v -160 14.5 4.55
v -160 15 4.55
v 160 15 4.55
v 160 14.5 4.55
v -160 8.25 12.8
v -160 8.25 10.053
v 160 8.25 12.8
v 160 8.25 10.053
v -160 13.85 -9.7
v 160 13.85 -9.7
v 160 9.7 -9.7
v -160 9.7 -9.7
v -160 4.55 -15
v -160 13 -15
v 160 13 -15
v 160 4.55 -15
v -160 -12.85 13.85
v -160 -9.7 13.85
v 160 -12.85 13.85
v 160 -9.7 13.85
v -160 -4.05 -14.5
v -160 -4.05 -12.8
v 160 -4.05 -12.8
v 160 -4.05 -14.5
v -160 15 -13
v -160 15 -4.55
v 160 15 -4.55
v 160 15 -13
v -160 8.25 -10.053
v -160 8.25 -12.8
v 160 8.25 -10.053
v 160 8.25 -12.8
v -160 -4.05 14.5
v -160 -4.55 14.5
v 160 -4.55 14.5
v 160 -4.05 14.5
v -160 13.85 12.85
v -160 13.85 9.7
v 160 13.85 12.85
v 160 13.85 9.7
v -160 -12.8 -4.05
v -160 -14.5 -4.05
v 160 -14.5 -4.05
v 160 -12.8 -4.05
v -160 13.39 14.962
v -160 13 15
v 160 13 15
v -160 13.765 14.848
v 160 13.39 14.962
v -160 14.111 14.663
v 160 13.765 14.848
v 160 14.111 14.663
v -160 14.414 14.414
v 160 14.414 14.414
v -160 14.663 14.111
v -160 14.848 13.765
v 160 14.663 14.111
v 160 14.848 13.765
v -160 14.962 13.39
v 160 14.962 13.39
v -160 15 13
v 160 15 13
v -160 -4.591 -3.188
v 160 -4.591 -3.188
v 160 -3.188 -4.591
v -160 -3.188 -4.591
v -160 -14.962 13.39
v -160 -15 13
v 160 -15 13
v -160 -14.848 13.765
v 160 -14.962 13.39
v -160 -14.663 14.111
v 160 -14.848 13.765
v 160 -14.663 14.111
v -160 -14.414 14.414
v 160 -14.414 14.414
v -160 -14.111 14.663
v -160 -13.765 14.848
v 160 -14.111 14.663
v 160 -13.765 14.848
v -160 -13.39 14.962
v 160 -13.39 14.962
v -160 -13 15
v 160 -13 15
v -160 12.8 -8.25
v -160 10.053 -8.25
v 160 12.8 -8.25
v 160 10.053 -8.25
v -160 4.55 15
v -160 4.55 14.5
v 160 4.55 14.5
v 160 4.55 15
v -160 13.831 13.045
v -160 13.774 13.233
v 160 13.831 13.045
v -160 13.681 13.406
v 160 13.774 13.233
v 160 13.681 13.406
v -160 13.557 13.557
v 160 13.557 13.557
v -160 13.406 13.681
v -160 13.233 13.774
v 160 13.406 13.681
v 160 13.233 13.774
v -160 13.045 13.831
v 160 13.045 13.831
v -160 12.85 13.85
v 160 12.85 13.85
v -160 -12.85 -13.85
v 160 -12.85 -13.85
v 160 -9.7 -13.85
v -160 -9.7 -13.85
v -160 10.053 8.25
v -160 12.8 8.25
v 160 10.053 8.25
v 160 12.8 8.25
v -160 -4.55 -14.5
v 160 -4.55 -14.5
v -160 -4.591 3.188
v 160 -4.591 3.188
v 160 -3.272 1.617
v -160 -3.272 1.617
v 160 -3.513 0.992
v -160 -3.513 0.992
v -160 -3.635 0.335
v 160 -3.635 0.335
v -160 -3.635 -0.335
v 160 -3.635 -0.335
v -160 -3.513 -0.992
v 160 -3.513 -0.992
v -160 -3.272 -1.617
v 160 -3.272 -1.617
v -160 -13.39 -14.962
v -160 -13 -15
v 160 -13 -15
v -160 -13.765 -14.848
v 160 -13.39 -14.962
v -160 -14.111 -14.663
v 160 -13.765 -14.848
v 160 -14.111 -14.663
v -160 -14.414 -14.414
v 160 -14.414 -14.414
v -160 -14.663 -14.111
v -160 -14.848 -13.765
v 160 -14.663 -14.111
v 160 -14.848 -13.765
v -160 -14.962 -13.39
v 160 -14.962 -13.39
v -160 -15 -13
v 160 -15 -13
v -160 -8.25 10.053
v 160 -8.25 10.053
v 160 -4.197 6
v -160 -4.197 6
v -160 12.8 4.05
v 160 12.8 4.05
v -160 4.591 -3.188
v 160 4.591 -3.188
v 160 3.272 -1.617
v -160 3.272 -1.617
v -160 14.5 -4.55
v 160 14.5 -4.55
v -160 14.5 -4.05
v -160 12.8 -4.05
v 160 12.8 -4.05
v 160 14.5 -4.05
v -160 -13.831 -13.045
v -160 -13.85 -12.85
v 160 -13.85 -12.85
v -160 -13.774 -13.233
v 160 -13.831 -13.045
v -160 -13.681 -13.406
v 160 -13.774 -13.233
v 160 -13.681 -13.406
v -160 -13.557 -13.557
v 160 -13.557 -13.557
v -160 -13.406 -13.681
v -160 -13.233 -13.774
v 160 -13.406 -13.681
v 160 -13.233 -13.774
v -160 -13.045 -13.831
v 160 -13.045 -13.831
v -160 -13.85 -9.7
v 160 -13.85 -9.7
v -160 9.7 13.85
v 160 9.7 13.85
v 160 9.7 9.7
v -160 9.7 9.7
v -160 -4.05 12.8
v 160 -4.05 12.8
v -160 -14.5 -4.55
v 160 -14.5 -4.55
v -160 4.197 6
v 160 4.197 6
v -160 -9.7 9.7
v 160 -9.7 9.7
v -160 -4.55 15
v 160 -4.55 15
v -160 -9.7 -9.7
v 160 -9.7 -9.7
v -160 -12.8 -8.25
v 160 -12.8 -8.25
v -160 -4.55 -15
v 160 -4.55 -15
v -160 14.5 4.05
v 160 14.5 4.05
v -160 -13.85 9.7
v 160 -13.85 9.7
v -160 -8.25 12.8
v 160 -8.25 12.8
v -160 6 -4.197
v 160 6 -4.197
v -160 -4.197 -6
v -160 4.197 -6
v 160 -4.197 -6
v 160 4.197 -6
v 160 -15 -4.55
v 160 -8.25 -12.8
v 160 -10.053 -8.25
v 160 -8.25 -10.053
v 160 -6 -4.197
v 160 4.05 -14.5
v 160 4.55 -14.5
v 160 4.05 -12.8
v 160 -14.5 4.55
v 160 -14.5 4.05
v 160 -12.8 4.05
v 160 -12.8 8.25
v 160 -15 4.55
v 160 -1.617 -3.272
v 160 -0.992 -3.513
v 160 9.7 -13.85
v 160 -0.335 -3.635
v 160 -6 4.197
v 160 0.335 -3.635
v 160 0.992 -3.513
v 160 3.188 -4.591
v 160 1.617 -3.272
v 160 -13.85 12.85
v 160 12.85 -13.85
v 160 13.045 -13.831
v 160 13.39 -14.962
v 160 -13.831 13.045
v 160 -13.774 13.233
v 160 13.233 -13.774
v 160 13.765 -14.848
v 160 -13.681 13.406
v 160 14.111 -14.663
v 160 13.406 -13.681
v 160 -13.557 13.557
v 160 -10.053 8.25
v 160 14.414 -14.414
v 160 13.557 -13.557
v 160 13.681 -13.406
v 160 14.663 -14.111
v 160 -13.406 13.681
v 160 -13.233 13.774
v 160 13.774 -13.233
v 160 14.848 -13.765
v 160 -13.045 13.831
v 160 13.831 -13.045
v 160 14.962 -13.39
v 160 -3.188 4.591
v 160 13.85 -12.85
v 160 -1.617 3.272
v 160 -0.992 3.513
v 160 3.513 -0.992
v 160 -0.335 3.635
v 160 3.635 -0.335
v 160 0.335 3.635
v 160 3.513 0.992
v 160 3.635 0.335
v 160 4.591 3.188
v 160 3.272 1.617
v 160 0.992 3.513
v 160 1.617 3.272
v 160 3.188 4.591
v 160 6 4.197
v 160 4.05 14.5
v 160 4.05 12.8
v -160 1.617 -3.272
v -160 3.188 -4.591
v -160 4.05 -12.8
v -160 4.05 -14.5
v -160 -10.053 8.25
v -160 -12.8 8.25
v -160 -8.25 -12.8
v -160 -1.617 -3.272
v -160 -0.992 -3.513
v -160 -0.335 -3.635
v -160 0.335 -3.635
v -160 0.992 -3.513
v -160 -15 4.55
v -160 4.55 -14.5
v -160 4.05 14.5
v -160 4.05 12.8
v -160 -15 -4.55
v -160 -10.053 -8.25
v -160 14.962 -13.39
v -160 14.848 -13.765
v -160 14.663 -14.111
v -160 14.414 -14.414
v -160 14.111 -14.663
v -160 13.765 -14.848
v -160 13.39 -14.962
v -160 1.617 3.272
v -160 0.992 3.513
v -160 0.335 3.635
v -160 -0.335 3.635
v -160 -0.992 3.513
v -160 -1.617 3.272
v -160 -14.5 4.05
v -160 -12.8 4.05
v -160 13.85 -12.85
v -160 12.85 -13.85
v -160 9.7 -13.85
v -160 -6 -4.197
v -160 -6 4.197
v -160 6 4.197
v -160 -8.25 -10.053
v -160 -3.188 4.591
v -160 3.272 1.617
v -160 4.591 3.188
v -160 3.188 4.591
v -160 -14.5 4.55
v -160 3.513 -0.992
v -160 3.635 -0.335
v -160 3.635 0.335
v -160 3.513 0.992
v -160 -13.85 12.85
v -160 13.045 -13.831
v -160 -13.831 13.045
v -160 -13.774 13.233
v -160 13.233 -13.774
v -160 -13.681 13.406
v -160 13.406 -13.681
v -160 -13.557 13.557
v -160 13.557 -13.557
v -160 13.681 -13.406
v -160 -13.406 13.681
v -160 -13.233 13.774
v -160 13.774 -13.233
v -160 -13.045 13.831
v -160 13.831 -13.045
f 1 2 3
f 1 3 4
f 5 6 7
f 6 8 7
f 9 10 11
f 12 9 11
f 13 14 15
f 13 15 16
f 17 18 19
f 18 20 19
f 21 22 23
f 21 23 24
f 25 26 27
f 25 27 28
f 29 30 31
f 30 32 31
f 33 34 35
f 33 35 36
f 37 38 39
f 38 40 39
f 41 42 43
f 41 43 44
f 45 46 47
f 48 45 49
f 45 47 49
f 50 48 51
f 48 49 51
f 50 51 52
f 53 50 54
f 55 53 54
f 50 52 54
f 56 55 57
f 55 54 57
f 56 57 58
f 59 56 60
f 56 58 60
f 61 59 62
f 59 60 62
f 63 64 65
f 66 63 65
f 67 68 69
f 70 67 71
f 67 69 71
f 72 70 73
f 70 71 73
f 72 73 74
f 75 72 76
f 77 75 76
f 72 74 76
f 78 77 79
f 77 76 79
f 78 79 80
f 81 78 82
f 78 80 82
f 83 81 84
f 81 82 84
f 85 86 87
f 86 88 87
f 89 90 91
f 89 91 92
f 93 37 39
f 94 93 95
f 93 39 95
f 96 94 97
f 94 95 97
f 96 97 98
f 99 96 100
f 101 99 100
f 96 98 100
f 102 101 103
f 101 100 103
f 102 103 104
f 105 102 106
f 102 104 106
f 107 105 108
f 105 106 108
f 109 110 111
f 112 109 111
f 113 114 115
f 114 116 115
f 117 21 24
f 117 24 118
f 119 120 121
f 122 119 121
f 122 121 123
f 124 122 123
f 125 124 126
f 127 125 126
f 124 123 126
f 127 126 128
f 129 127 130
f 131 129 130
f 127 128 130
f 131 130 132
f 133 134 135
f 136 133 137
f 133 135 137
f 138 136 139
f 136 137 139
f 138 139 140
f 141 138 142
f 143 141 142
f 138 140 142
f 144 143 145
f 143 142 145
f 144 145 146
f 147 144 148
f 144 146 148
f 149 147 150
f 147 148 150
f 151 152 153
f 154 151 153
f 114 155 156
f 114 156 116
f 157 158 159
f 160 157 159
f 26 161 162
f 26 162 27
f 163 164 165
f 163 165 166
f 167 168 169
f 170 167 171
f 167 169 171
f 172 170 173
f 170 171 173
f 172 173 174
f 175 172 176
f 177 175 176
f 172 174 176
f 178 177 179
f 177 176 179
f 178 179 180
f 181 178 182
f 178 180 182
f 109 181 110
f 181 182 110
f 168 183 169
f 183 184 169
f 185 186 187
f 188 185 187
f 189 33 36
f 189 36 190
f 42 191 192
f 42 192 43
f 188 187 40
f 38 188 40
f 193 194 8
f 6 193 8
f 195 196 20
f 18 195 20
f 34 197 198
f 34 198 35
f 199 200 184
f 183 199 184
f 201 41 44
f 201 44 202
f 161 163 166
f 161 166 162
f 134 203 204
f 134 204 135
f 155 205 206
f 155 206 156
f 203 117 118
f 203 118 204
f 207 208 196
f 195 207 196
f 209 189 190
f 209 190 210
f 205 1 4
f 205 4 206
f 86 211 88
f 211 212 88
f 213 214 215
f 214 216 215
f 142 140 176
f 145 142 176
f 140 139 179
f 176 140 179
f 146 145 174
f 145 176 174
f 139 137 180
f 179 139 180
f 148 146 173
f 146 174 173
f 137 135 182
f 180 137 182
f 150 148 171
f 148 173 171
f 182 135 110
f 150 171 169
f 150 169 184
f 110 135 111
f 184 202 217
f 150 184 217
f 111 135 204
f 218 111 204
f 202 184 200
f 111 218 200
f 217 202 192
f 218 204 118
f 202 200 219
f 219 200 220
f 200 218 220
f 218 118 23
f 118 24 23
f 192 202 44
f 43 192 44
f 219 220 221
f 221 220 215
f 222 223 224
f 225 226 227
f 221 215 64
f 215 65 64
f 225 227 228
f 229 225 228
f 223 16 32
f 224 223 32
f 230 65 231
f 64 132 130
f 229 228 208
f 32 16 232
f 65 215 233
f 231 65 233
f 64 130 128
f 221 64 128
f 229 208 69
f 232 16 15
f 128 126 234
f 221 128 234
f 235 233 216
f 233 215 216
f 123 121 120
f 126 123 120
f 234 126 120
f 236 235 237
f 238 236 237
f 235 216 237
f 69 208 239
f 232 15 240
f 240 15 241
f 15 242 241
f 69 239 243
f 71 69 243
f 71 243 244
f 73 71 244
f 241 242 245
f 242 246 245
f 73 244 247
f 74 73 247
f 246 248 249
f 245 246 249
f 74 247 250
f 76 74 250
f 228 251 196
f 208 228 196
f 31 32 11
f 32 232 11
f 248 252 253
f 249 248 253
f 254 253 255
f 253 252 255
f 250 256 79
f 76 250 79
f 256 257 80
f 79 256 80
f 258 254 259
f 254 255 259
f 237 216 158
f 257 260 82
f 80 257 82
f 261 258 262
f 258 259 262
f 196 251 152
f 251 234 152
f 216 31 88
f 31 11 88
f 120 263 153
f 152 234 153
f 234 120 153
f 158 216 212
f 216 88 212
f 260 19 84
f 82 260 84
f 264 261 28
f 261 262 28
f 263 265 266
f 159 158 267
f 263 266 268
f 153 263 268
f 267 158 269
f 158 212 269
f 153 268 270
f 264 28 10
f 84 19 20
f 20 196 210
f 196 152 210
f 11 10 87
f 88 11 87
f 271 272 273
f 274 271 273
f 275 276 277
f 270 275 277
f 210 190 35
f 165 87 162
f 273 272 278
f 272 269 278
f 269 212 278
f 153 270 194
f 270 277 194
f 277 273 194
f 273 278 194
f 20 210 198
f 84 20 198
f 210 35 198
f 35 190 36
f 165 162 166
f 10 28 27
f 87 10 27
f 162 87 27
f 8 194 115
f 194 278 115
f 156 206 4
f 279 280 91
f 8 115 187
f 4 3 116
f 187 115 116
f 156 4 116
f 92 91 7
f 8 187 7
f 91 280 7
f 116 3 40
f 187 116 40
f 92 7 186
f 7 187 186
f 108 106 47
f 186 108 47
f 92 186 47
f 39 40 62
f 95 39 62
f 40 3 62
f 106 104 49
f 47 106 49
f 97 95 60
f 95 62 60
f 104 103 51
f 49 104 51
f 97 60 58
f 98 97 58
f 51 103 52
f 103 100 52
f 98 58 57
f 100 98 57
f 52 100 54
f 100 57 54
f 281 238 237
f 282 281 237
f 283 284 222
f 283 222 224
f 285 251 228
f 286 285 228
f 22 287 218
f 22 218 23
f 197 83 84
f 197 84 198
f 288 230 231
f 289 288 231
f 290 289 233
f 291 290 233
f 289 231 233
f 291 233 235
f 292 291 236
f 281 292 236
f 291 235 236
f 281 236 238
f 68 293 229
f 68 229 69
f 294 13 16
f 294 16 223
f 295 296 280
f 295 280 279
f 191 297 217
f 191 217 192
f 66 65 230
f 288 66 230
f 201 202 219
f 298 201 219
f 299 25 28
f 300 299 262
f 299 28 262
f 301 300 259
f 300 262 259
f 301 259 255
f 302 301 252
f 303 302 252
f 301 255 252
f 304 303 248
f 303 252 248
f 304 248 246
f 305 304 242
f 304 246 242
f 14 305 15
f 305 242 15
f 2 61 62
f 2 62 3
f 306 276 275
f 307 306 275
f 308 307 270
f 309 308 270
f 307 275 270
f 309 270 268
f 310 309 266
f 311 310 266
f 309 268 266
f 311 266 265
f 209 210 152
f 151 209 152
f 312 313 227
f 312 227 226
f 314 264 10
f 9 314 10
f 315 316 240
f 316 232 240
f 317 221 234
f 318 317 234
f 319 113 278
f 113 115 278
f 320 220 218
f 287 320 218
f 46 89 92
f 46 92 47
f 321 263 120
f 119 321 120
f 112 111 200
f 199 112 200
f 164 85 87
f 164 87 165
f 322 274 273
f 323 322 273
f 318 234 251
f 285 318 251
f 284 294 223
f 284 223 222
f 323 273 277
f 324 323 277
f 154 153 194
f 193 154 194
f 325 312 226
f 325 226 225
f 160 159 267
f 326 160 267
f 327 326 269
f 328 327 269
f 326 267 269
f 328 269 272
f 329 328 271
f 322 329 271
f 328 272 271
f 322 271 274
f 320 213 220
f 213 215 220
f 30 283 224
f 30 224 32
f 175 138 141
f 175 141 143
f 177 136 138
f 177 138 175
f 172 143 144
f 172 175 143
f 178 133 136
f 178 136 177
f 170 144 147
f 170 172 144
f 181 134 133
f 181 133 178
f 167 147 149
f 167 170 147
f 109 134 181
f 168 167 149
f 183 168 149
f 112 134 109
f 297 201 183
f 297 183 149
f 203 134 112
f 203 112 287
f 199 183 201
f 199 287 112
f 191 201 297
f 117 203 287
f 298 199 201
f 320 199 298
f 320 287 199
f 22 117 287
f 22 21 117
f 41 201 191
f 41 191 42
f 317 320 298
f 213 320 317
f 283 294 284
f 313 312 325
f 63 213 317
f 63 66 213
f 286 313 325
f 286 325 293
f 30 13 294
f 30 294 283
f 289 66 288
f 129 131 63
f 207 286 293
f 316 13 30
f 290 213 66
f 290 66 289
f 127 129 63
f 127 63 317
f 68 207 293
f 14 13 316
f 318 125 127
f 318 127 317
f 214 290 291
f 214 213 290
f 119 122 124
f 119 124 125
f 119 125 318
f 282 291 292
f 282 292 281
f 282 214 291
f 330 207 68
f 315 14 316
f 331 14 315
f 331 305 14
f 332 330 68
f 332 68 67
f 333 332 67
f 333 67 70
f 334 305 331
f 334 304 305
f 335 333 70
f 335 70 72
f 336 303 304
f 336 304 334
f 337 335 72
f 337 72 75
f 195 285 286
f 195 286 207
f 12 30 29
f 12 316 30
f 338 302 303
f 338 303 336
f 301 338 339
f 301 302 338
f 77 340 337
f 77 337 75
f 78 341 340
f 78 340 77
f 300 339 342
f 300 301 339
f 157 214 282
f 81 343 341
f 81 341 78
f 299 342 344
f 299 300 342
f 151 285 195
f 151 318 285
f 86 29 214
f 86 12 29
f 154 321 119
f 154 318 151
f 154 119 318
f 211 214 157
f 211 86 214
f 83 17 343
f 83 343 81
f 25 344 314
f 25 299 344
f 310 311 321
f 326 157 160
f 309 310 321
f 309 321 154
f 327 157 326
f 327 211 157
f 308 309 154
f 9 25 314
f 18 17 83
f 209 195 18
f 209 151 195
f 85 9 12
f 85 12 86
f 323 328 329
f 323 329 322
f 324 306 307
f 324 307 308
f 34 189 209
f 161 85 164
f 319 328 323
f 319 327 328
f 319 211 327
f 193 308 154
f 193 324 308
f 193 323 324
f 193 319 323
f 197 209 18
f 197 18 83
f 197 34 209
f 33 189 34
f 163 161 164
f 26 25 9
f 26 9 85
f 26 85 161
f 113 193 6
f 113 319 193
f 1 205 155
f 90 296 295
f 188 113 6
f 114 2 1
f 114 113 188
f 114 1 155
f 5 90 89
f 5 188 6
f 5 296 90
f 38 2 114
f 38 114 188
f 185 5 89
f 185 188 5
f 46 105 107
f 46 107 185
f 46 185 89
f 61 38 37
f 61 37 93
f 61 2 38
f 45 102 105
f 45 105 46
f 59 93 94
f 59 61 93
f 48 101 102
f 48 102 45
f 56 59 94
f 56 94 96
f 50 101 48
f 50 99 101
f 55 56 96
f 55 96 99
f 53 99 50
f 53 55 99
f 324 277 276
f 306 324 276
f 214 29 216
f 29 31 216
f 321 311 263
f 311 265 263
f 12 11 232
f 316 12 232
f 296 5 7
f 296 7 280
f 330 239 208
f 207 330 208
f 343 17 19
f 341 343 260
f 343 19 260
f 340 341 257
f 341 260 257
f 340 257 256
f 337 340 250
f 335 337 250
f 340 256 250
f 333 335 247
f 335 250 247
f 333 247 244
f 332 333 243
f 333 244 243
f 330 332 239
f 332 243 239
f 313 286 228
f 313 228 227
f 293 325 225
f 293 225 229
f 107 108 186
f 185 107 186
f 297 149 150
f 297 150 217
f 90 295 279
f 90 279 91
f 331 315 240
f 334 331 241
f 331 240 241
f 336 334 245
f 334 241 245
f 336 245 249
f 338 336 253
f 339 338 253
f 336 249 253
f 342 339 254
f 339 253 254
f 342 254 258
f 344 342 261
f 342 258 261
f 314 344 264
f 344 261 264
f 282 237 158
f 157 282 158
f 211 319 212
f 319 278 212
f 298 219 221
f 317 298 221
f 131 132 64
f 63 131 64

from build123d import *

# Parameters (mm, degrees)
BR_EXTRUDE_DEPTH      = 160
BR_EXTRUDE_DEPTH_BACK = 160


with BuildPart() as part:
    # Sketch2 → BR_Extrude (new body, two sides)
    with BuildSketch(Plane(origin=(0, 0, 0), x_dir=(0, 0, -1), z_dir=(1, 0, 0))) as br_extrude_sk:
        with BuildLine():
            Line((-6, 4.196877708), (-10.053122292, 8.25))
            Line((-10.053122292, 8.25), (-12.8, 8.25))
            Line((-12.8, 8.25), (-12.800036742, 4.05))
            Line((-12.800036742, 4.05), (-14.5, 4.05))
            Line((-14.5, 4.05), (-14.5, 4.55))
            Line((-14.5, 4.55), (-15, 4.55))
            Line((-15, 4.55), (-15, 13))
            ThreePointArc((-15, 13), (-14.414213562, 14.414213562), (-13, 15))
            Line((-13, 15), (-4.55, 15))
            Line((-4.55, 15), (-4.55, 14.5))
            Line((-4.55, 14.5), (-4.05, 14.5))
            Line((-4.05, 14.5), (-4.05, 12.800036742))
            Line((-4.05, 12.800036742), (-8.25, 12.8))
            Line((-8.25, 12.8), (-8.25, 10.053122292))
            Line((-8.25, 10.053122292), (-4.196877708, 6))
            Line((-4.196877708, 6), (4.196877708, 6))
            Line((4.196877708, 6), (8.25, 10.053122292))
            Line((8.25, 10.053122292), (8.25, 12.8))
            Line((8.25, 12.8), (4.05, 12.800036742))
            Line((4.05, 12.800036742), (4.05, 14.5))
            Line((4.05, 14.5), (4.55, 14.5))
            Line((4.55, 14.5), (4.55, 15))
            Line((4.55, 15), (13, 15))
            ThreePointArc((13, 15), (14.414213562, 14.414213562), (15, 13))
            Line((15, 13), (15, 4.55))
            Line((15, 4.55), (14.5, 4.55))
            Line((14.5, 4.55), (14.5, 4.05))
            Line((14.5, 4.05), (12.800036742, 4.05))
            Line((12.800036742, 4.05), (12.8, 8.25))
            Line((12.8, 8.25), (10.053122292, 8.25))
            Line((10.053122292, 8.25), (6, 4.196877708))
            Line((6, 4.196877708), (6, -4.196877708))
            Line((6, -4.196877708), (10.053122292, -8.25))
            Line((10.053122292, -8.25), (12.8, -8.25))
            Line((12.8, -8.25), (12.800036742, -4.05))
            Line((12.800036742, -4.05), (14.5, -4.05))
            Line((14.5, -4.05), (14.5, -4.55))
            Line((14.5, -4.55), (15, -4.55))
            Line((15, -4.55), (15, -13))
            ThreePointArc((15, -13), (14.414213562, -14.414213562), (13, -15))
            Line((13, -15), (4.55, -15))
            Line((4.55, -15), (4.55, -14.5))
            Line((4.55, -14.5), (4.05, -14.5))
            Line((4.05, -14.5), (4.05, -12.800036742))
            Line((4.05, -12.800036742), (8.25, -12.8))
            Line((8.25, -12.8), (8.25, -10.053122292))
            Line((8.25, -10.053122292), (4.196877708, -6))
            Line((4.196877708, -6), (-4.196877708, -6))
            Line((-4.196877708, -6), (-8.25, -10.053122292))
            Line((-8.25, -10.053122292), (-8.25, -12.8))
            Line((-8.25, -12.8), (-4.05, -12.800036742))
            Line((-4.05, -12.800036742), (-4.05, -14.5))
            Line((-4.05, -14.5), (-4.55, -14.5))
            Line((-4.55, -14.5), (-4.55, -15))
            Line((-4.55, -15), (-13, -15))
            ThreePointArc((-13, -15), (-14.414213562, -14.414213562), (-15, -13))
            Line((-15, -13), (-15, -4.55))
            Line((-15, -4.55), (-14.5, -4.55))
            Line((-14.5, -4.55), (-14.5, -4.05))
            Line((-14.5, -4.05), (-12.800036742, -4.05))
            Line((-12.800036742, -4.05), (-12.8, -8.25))
            Line((-12.8, -8.25), (-10.053122292, -8.25))
            Line((-10.053122292, -8.25), (-6, -4.196877708))
            Line((-6, -4.196877708), (-6, 4.196877708))
        make_face()
        with BuildLine():
            Line((-13.85, -9.7), (-13.85, -12.85))
            ThreePointArc((-13.85, -12.85), (-13.557106781, -13.557106781), (-12.85, -13.85))
            Line((-12.85, -13.85), (-9.7, -13.85))
            Line((-9.7, -13.85), (-9.7, -9.7))
            Line((-9.7, -9.7), (-13.85, -9.7))
        make_face(mode=Mode.SUBTRACT)
        with BuildLine():
            Line((9.7, -13.85), (12.85, -13.85))
            ThreePointArc((12.85, -13.85), (13.557106781, -13.557106781), (13.85, -12.85))
            Line((13.85, -12.85), (13.85, -9.7))
            Line((13.85, -9.7), (9.7, -9.7))
            Line((9.7, -9.7), (9.7, -13.85))
        make_face(mode=Mode.SUBTRACT)
        with BuildLine():
            Line((13.85, 9.7), (13.85, 12.85))
            ThreePointArc((13.85, 12.85), (13.557106781, 13.557106781), (12.85, 13.85))
            Line((12.85, 13.85), (9.7, 13.85))
            Line((9.7, 13.85), (9.7, 9.7))
            Line((9.7, 9.7), (13.85, 9.7))
        make_face(mode=Mode.SUBTRACT)
        with BuildLine():
            Line((-9.7, 13.85), (-12.85, 13.85))
            ThreePointArc((-12.85, 13.85), (-13.557106781, 13.557106781), (-13.85, 12.85))
            Line((-13.85, 12.85), (-13.85, 9.7))
            Line((-13.85, 9.7), (-9.7, 9.7))
            Line((-9.7, 9.7), (-9.7, 13.85))
        make_face(mode=Mode.SUBTRACT)
        with BuildLine():
            Line((-3.272394192, -1.616767223), (-4.59052283, -3.187651763))
            Line((-4.59052283, -3.187651763), (-3.187651763, -4.59052283))
            Line((-3.187651763, -4.59052283), (-1.616767223, -3.272394192))
            ThreePointArc((-1.616767223, -3.272394192), (0, -3.65), (1.616767223, -3.272394192))
            Line((1.616767223, -3.272394192), (3.187651763, -4.59052283))
            Line((3.187651763, -4.59052283), (4.59052283, -3.187651763))
            Line((4.59052283, -3.187651763), (3.272394192, -1.616767223))
            ThreePointArc((3.272394192, -1.616767223), (3.65, 0), (3.272394192, 1.616767223))
            Line((3.272394192, 1.616767223), (4.59052283, 3.187651763))
            Line((4.59052283, 3.187651763), (3.187651763, 4.59052283))
            Line((3.187651763, 4.59052283), (1.616767223, 3.272394192))
            ThreePointArc((1.616767223, 3.272394192), (0, 3.65), (-1.616767223, 3.272394192))
            Line((-1.616767223, 3.272394192), (-3.187651763, 4.59052283))
            Line((-3.187651763, 4.59052283), (-4.59052283, 3.187651763))
            Line((-4.59052283, 3.187651763), (-3.272394192, 1.616767223))
            ThreePointArc((-3.272394192, 1.616767223), (-3.65, 0), (-3.272394192, -1.616767223))
        make_face(mode=Mode.SUBTRACT)
    extrude(amount=BR_EXTRUDE_DEPTH)
    extrude(br_extrude_sk.sketch, amount=-BR_EXTRUDE_DEPTH_BACK)


solid = part.part
